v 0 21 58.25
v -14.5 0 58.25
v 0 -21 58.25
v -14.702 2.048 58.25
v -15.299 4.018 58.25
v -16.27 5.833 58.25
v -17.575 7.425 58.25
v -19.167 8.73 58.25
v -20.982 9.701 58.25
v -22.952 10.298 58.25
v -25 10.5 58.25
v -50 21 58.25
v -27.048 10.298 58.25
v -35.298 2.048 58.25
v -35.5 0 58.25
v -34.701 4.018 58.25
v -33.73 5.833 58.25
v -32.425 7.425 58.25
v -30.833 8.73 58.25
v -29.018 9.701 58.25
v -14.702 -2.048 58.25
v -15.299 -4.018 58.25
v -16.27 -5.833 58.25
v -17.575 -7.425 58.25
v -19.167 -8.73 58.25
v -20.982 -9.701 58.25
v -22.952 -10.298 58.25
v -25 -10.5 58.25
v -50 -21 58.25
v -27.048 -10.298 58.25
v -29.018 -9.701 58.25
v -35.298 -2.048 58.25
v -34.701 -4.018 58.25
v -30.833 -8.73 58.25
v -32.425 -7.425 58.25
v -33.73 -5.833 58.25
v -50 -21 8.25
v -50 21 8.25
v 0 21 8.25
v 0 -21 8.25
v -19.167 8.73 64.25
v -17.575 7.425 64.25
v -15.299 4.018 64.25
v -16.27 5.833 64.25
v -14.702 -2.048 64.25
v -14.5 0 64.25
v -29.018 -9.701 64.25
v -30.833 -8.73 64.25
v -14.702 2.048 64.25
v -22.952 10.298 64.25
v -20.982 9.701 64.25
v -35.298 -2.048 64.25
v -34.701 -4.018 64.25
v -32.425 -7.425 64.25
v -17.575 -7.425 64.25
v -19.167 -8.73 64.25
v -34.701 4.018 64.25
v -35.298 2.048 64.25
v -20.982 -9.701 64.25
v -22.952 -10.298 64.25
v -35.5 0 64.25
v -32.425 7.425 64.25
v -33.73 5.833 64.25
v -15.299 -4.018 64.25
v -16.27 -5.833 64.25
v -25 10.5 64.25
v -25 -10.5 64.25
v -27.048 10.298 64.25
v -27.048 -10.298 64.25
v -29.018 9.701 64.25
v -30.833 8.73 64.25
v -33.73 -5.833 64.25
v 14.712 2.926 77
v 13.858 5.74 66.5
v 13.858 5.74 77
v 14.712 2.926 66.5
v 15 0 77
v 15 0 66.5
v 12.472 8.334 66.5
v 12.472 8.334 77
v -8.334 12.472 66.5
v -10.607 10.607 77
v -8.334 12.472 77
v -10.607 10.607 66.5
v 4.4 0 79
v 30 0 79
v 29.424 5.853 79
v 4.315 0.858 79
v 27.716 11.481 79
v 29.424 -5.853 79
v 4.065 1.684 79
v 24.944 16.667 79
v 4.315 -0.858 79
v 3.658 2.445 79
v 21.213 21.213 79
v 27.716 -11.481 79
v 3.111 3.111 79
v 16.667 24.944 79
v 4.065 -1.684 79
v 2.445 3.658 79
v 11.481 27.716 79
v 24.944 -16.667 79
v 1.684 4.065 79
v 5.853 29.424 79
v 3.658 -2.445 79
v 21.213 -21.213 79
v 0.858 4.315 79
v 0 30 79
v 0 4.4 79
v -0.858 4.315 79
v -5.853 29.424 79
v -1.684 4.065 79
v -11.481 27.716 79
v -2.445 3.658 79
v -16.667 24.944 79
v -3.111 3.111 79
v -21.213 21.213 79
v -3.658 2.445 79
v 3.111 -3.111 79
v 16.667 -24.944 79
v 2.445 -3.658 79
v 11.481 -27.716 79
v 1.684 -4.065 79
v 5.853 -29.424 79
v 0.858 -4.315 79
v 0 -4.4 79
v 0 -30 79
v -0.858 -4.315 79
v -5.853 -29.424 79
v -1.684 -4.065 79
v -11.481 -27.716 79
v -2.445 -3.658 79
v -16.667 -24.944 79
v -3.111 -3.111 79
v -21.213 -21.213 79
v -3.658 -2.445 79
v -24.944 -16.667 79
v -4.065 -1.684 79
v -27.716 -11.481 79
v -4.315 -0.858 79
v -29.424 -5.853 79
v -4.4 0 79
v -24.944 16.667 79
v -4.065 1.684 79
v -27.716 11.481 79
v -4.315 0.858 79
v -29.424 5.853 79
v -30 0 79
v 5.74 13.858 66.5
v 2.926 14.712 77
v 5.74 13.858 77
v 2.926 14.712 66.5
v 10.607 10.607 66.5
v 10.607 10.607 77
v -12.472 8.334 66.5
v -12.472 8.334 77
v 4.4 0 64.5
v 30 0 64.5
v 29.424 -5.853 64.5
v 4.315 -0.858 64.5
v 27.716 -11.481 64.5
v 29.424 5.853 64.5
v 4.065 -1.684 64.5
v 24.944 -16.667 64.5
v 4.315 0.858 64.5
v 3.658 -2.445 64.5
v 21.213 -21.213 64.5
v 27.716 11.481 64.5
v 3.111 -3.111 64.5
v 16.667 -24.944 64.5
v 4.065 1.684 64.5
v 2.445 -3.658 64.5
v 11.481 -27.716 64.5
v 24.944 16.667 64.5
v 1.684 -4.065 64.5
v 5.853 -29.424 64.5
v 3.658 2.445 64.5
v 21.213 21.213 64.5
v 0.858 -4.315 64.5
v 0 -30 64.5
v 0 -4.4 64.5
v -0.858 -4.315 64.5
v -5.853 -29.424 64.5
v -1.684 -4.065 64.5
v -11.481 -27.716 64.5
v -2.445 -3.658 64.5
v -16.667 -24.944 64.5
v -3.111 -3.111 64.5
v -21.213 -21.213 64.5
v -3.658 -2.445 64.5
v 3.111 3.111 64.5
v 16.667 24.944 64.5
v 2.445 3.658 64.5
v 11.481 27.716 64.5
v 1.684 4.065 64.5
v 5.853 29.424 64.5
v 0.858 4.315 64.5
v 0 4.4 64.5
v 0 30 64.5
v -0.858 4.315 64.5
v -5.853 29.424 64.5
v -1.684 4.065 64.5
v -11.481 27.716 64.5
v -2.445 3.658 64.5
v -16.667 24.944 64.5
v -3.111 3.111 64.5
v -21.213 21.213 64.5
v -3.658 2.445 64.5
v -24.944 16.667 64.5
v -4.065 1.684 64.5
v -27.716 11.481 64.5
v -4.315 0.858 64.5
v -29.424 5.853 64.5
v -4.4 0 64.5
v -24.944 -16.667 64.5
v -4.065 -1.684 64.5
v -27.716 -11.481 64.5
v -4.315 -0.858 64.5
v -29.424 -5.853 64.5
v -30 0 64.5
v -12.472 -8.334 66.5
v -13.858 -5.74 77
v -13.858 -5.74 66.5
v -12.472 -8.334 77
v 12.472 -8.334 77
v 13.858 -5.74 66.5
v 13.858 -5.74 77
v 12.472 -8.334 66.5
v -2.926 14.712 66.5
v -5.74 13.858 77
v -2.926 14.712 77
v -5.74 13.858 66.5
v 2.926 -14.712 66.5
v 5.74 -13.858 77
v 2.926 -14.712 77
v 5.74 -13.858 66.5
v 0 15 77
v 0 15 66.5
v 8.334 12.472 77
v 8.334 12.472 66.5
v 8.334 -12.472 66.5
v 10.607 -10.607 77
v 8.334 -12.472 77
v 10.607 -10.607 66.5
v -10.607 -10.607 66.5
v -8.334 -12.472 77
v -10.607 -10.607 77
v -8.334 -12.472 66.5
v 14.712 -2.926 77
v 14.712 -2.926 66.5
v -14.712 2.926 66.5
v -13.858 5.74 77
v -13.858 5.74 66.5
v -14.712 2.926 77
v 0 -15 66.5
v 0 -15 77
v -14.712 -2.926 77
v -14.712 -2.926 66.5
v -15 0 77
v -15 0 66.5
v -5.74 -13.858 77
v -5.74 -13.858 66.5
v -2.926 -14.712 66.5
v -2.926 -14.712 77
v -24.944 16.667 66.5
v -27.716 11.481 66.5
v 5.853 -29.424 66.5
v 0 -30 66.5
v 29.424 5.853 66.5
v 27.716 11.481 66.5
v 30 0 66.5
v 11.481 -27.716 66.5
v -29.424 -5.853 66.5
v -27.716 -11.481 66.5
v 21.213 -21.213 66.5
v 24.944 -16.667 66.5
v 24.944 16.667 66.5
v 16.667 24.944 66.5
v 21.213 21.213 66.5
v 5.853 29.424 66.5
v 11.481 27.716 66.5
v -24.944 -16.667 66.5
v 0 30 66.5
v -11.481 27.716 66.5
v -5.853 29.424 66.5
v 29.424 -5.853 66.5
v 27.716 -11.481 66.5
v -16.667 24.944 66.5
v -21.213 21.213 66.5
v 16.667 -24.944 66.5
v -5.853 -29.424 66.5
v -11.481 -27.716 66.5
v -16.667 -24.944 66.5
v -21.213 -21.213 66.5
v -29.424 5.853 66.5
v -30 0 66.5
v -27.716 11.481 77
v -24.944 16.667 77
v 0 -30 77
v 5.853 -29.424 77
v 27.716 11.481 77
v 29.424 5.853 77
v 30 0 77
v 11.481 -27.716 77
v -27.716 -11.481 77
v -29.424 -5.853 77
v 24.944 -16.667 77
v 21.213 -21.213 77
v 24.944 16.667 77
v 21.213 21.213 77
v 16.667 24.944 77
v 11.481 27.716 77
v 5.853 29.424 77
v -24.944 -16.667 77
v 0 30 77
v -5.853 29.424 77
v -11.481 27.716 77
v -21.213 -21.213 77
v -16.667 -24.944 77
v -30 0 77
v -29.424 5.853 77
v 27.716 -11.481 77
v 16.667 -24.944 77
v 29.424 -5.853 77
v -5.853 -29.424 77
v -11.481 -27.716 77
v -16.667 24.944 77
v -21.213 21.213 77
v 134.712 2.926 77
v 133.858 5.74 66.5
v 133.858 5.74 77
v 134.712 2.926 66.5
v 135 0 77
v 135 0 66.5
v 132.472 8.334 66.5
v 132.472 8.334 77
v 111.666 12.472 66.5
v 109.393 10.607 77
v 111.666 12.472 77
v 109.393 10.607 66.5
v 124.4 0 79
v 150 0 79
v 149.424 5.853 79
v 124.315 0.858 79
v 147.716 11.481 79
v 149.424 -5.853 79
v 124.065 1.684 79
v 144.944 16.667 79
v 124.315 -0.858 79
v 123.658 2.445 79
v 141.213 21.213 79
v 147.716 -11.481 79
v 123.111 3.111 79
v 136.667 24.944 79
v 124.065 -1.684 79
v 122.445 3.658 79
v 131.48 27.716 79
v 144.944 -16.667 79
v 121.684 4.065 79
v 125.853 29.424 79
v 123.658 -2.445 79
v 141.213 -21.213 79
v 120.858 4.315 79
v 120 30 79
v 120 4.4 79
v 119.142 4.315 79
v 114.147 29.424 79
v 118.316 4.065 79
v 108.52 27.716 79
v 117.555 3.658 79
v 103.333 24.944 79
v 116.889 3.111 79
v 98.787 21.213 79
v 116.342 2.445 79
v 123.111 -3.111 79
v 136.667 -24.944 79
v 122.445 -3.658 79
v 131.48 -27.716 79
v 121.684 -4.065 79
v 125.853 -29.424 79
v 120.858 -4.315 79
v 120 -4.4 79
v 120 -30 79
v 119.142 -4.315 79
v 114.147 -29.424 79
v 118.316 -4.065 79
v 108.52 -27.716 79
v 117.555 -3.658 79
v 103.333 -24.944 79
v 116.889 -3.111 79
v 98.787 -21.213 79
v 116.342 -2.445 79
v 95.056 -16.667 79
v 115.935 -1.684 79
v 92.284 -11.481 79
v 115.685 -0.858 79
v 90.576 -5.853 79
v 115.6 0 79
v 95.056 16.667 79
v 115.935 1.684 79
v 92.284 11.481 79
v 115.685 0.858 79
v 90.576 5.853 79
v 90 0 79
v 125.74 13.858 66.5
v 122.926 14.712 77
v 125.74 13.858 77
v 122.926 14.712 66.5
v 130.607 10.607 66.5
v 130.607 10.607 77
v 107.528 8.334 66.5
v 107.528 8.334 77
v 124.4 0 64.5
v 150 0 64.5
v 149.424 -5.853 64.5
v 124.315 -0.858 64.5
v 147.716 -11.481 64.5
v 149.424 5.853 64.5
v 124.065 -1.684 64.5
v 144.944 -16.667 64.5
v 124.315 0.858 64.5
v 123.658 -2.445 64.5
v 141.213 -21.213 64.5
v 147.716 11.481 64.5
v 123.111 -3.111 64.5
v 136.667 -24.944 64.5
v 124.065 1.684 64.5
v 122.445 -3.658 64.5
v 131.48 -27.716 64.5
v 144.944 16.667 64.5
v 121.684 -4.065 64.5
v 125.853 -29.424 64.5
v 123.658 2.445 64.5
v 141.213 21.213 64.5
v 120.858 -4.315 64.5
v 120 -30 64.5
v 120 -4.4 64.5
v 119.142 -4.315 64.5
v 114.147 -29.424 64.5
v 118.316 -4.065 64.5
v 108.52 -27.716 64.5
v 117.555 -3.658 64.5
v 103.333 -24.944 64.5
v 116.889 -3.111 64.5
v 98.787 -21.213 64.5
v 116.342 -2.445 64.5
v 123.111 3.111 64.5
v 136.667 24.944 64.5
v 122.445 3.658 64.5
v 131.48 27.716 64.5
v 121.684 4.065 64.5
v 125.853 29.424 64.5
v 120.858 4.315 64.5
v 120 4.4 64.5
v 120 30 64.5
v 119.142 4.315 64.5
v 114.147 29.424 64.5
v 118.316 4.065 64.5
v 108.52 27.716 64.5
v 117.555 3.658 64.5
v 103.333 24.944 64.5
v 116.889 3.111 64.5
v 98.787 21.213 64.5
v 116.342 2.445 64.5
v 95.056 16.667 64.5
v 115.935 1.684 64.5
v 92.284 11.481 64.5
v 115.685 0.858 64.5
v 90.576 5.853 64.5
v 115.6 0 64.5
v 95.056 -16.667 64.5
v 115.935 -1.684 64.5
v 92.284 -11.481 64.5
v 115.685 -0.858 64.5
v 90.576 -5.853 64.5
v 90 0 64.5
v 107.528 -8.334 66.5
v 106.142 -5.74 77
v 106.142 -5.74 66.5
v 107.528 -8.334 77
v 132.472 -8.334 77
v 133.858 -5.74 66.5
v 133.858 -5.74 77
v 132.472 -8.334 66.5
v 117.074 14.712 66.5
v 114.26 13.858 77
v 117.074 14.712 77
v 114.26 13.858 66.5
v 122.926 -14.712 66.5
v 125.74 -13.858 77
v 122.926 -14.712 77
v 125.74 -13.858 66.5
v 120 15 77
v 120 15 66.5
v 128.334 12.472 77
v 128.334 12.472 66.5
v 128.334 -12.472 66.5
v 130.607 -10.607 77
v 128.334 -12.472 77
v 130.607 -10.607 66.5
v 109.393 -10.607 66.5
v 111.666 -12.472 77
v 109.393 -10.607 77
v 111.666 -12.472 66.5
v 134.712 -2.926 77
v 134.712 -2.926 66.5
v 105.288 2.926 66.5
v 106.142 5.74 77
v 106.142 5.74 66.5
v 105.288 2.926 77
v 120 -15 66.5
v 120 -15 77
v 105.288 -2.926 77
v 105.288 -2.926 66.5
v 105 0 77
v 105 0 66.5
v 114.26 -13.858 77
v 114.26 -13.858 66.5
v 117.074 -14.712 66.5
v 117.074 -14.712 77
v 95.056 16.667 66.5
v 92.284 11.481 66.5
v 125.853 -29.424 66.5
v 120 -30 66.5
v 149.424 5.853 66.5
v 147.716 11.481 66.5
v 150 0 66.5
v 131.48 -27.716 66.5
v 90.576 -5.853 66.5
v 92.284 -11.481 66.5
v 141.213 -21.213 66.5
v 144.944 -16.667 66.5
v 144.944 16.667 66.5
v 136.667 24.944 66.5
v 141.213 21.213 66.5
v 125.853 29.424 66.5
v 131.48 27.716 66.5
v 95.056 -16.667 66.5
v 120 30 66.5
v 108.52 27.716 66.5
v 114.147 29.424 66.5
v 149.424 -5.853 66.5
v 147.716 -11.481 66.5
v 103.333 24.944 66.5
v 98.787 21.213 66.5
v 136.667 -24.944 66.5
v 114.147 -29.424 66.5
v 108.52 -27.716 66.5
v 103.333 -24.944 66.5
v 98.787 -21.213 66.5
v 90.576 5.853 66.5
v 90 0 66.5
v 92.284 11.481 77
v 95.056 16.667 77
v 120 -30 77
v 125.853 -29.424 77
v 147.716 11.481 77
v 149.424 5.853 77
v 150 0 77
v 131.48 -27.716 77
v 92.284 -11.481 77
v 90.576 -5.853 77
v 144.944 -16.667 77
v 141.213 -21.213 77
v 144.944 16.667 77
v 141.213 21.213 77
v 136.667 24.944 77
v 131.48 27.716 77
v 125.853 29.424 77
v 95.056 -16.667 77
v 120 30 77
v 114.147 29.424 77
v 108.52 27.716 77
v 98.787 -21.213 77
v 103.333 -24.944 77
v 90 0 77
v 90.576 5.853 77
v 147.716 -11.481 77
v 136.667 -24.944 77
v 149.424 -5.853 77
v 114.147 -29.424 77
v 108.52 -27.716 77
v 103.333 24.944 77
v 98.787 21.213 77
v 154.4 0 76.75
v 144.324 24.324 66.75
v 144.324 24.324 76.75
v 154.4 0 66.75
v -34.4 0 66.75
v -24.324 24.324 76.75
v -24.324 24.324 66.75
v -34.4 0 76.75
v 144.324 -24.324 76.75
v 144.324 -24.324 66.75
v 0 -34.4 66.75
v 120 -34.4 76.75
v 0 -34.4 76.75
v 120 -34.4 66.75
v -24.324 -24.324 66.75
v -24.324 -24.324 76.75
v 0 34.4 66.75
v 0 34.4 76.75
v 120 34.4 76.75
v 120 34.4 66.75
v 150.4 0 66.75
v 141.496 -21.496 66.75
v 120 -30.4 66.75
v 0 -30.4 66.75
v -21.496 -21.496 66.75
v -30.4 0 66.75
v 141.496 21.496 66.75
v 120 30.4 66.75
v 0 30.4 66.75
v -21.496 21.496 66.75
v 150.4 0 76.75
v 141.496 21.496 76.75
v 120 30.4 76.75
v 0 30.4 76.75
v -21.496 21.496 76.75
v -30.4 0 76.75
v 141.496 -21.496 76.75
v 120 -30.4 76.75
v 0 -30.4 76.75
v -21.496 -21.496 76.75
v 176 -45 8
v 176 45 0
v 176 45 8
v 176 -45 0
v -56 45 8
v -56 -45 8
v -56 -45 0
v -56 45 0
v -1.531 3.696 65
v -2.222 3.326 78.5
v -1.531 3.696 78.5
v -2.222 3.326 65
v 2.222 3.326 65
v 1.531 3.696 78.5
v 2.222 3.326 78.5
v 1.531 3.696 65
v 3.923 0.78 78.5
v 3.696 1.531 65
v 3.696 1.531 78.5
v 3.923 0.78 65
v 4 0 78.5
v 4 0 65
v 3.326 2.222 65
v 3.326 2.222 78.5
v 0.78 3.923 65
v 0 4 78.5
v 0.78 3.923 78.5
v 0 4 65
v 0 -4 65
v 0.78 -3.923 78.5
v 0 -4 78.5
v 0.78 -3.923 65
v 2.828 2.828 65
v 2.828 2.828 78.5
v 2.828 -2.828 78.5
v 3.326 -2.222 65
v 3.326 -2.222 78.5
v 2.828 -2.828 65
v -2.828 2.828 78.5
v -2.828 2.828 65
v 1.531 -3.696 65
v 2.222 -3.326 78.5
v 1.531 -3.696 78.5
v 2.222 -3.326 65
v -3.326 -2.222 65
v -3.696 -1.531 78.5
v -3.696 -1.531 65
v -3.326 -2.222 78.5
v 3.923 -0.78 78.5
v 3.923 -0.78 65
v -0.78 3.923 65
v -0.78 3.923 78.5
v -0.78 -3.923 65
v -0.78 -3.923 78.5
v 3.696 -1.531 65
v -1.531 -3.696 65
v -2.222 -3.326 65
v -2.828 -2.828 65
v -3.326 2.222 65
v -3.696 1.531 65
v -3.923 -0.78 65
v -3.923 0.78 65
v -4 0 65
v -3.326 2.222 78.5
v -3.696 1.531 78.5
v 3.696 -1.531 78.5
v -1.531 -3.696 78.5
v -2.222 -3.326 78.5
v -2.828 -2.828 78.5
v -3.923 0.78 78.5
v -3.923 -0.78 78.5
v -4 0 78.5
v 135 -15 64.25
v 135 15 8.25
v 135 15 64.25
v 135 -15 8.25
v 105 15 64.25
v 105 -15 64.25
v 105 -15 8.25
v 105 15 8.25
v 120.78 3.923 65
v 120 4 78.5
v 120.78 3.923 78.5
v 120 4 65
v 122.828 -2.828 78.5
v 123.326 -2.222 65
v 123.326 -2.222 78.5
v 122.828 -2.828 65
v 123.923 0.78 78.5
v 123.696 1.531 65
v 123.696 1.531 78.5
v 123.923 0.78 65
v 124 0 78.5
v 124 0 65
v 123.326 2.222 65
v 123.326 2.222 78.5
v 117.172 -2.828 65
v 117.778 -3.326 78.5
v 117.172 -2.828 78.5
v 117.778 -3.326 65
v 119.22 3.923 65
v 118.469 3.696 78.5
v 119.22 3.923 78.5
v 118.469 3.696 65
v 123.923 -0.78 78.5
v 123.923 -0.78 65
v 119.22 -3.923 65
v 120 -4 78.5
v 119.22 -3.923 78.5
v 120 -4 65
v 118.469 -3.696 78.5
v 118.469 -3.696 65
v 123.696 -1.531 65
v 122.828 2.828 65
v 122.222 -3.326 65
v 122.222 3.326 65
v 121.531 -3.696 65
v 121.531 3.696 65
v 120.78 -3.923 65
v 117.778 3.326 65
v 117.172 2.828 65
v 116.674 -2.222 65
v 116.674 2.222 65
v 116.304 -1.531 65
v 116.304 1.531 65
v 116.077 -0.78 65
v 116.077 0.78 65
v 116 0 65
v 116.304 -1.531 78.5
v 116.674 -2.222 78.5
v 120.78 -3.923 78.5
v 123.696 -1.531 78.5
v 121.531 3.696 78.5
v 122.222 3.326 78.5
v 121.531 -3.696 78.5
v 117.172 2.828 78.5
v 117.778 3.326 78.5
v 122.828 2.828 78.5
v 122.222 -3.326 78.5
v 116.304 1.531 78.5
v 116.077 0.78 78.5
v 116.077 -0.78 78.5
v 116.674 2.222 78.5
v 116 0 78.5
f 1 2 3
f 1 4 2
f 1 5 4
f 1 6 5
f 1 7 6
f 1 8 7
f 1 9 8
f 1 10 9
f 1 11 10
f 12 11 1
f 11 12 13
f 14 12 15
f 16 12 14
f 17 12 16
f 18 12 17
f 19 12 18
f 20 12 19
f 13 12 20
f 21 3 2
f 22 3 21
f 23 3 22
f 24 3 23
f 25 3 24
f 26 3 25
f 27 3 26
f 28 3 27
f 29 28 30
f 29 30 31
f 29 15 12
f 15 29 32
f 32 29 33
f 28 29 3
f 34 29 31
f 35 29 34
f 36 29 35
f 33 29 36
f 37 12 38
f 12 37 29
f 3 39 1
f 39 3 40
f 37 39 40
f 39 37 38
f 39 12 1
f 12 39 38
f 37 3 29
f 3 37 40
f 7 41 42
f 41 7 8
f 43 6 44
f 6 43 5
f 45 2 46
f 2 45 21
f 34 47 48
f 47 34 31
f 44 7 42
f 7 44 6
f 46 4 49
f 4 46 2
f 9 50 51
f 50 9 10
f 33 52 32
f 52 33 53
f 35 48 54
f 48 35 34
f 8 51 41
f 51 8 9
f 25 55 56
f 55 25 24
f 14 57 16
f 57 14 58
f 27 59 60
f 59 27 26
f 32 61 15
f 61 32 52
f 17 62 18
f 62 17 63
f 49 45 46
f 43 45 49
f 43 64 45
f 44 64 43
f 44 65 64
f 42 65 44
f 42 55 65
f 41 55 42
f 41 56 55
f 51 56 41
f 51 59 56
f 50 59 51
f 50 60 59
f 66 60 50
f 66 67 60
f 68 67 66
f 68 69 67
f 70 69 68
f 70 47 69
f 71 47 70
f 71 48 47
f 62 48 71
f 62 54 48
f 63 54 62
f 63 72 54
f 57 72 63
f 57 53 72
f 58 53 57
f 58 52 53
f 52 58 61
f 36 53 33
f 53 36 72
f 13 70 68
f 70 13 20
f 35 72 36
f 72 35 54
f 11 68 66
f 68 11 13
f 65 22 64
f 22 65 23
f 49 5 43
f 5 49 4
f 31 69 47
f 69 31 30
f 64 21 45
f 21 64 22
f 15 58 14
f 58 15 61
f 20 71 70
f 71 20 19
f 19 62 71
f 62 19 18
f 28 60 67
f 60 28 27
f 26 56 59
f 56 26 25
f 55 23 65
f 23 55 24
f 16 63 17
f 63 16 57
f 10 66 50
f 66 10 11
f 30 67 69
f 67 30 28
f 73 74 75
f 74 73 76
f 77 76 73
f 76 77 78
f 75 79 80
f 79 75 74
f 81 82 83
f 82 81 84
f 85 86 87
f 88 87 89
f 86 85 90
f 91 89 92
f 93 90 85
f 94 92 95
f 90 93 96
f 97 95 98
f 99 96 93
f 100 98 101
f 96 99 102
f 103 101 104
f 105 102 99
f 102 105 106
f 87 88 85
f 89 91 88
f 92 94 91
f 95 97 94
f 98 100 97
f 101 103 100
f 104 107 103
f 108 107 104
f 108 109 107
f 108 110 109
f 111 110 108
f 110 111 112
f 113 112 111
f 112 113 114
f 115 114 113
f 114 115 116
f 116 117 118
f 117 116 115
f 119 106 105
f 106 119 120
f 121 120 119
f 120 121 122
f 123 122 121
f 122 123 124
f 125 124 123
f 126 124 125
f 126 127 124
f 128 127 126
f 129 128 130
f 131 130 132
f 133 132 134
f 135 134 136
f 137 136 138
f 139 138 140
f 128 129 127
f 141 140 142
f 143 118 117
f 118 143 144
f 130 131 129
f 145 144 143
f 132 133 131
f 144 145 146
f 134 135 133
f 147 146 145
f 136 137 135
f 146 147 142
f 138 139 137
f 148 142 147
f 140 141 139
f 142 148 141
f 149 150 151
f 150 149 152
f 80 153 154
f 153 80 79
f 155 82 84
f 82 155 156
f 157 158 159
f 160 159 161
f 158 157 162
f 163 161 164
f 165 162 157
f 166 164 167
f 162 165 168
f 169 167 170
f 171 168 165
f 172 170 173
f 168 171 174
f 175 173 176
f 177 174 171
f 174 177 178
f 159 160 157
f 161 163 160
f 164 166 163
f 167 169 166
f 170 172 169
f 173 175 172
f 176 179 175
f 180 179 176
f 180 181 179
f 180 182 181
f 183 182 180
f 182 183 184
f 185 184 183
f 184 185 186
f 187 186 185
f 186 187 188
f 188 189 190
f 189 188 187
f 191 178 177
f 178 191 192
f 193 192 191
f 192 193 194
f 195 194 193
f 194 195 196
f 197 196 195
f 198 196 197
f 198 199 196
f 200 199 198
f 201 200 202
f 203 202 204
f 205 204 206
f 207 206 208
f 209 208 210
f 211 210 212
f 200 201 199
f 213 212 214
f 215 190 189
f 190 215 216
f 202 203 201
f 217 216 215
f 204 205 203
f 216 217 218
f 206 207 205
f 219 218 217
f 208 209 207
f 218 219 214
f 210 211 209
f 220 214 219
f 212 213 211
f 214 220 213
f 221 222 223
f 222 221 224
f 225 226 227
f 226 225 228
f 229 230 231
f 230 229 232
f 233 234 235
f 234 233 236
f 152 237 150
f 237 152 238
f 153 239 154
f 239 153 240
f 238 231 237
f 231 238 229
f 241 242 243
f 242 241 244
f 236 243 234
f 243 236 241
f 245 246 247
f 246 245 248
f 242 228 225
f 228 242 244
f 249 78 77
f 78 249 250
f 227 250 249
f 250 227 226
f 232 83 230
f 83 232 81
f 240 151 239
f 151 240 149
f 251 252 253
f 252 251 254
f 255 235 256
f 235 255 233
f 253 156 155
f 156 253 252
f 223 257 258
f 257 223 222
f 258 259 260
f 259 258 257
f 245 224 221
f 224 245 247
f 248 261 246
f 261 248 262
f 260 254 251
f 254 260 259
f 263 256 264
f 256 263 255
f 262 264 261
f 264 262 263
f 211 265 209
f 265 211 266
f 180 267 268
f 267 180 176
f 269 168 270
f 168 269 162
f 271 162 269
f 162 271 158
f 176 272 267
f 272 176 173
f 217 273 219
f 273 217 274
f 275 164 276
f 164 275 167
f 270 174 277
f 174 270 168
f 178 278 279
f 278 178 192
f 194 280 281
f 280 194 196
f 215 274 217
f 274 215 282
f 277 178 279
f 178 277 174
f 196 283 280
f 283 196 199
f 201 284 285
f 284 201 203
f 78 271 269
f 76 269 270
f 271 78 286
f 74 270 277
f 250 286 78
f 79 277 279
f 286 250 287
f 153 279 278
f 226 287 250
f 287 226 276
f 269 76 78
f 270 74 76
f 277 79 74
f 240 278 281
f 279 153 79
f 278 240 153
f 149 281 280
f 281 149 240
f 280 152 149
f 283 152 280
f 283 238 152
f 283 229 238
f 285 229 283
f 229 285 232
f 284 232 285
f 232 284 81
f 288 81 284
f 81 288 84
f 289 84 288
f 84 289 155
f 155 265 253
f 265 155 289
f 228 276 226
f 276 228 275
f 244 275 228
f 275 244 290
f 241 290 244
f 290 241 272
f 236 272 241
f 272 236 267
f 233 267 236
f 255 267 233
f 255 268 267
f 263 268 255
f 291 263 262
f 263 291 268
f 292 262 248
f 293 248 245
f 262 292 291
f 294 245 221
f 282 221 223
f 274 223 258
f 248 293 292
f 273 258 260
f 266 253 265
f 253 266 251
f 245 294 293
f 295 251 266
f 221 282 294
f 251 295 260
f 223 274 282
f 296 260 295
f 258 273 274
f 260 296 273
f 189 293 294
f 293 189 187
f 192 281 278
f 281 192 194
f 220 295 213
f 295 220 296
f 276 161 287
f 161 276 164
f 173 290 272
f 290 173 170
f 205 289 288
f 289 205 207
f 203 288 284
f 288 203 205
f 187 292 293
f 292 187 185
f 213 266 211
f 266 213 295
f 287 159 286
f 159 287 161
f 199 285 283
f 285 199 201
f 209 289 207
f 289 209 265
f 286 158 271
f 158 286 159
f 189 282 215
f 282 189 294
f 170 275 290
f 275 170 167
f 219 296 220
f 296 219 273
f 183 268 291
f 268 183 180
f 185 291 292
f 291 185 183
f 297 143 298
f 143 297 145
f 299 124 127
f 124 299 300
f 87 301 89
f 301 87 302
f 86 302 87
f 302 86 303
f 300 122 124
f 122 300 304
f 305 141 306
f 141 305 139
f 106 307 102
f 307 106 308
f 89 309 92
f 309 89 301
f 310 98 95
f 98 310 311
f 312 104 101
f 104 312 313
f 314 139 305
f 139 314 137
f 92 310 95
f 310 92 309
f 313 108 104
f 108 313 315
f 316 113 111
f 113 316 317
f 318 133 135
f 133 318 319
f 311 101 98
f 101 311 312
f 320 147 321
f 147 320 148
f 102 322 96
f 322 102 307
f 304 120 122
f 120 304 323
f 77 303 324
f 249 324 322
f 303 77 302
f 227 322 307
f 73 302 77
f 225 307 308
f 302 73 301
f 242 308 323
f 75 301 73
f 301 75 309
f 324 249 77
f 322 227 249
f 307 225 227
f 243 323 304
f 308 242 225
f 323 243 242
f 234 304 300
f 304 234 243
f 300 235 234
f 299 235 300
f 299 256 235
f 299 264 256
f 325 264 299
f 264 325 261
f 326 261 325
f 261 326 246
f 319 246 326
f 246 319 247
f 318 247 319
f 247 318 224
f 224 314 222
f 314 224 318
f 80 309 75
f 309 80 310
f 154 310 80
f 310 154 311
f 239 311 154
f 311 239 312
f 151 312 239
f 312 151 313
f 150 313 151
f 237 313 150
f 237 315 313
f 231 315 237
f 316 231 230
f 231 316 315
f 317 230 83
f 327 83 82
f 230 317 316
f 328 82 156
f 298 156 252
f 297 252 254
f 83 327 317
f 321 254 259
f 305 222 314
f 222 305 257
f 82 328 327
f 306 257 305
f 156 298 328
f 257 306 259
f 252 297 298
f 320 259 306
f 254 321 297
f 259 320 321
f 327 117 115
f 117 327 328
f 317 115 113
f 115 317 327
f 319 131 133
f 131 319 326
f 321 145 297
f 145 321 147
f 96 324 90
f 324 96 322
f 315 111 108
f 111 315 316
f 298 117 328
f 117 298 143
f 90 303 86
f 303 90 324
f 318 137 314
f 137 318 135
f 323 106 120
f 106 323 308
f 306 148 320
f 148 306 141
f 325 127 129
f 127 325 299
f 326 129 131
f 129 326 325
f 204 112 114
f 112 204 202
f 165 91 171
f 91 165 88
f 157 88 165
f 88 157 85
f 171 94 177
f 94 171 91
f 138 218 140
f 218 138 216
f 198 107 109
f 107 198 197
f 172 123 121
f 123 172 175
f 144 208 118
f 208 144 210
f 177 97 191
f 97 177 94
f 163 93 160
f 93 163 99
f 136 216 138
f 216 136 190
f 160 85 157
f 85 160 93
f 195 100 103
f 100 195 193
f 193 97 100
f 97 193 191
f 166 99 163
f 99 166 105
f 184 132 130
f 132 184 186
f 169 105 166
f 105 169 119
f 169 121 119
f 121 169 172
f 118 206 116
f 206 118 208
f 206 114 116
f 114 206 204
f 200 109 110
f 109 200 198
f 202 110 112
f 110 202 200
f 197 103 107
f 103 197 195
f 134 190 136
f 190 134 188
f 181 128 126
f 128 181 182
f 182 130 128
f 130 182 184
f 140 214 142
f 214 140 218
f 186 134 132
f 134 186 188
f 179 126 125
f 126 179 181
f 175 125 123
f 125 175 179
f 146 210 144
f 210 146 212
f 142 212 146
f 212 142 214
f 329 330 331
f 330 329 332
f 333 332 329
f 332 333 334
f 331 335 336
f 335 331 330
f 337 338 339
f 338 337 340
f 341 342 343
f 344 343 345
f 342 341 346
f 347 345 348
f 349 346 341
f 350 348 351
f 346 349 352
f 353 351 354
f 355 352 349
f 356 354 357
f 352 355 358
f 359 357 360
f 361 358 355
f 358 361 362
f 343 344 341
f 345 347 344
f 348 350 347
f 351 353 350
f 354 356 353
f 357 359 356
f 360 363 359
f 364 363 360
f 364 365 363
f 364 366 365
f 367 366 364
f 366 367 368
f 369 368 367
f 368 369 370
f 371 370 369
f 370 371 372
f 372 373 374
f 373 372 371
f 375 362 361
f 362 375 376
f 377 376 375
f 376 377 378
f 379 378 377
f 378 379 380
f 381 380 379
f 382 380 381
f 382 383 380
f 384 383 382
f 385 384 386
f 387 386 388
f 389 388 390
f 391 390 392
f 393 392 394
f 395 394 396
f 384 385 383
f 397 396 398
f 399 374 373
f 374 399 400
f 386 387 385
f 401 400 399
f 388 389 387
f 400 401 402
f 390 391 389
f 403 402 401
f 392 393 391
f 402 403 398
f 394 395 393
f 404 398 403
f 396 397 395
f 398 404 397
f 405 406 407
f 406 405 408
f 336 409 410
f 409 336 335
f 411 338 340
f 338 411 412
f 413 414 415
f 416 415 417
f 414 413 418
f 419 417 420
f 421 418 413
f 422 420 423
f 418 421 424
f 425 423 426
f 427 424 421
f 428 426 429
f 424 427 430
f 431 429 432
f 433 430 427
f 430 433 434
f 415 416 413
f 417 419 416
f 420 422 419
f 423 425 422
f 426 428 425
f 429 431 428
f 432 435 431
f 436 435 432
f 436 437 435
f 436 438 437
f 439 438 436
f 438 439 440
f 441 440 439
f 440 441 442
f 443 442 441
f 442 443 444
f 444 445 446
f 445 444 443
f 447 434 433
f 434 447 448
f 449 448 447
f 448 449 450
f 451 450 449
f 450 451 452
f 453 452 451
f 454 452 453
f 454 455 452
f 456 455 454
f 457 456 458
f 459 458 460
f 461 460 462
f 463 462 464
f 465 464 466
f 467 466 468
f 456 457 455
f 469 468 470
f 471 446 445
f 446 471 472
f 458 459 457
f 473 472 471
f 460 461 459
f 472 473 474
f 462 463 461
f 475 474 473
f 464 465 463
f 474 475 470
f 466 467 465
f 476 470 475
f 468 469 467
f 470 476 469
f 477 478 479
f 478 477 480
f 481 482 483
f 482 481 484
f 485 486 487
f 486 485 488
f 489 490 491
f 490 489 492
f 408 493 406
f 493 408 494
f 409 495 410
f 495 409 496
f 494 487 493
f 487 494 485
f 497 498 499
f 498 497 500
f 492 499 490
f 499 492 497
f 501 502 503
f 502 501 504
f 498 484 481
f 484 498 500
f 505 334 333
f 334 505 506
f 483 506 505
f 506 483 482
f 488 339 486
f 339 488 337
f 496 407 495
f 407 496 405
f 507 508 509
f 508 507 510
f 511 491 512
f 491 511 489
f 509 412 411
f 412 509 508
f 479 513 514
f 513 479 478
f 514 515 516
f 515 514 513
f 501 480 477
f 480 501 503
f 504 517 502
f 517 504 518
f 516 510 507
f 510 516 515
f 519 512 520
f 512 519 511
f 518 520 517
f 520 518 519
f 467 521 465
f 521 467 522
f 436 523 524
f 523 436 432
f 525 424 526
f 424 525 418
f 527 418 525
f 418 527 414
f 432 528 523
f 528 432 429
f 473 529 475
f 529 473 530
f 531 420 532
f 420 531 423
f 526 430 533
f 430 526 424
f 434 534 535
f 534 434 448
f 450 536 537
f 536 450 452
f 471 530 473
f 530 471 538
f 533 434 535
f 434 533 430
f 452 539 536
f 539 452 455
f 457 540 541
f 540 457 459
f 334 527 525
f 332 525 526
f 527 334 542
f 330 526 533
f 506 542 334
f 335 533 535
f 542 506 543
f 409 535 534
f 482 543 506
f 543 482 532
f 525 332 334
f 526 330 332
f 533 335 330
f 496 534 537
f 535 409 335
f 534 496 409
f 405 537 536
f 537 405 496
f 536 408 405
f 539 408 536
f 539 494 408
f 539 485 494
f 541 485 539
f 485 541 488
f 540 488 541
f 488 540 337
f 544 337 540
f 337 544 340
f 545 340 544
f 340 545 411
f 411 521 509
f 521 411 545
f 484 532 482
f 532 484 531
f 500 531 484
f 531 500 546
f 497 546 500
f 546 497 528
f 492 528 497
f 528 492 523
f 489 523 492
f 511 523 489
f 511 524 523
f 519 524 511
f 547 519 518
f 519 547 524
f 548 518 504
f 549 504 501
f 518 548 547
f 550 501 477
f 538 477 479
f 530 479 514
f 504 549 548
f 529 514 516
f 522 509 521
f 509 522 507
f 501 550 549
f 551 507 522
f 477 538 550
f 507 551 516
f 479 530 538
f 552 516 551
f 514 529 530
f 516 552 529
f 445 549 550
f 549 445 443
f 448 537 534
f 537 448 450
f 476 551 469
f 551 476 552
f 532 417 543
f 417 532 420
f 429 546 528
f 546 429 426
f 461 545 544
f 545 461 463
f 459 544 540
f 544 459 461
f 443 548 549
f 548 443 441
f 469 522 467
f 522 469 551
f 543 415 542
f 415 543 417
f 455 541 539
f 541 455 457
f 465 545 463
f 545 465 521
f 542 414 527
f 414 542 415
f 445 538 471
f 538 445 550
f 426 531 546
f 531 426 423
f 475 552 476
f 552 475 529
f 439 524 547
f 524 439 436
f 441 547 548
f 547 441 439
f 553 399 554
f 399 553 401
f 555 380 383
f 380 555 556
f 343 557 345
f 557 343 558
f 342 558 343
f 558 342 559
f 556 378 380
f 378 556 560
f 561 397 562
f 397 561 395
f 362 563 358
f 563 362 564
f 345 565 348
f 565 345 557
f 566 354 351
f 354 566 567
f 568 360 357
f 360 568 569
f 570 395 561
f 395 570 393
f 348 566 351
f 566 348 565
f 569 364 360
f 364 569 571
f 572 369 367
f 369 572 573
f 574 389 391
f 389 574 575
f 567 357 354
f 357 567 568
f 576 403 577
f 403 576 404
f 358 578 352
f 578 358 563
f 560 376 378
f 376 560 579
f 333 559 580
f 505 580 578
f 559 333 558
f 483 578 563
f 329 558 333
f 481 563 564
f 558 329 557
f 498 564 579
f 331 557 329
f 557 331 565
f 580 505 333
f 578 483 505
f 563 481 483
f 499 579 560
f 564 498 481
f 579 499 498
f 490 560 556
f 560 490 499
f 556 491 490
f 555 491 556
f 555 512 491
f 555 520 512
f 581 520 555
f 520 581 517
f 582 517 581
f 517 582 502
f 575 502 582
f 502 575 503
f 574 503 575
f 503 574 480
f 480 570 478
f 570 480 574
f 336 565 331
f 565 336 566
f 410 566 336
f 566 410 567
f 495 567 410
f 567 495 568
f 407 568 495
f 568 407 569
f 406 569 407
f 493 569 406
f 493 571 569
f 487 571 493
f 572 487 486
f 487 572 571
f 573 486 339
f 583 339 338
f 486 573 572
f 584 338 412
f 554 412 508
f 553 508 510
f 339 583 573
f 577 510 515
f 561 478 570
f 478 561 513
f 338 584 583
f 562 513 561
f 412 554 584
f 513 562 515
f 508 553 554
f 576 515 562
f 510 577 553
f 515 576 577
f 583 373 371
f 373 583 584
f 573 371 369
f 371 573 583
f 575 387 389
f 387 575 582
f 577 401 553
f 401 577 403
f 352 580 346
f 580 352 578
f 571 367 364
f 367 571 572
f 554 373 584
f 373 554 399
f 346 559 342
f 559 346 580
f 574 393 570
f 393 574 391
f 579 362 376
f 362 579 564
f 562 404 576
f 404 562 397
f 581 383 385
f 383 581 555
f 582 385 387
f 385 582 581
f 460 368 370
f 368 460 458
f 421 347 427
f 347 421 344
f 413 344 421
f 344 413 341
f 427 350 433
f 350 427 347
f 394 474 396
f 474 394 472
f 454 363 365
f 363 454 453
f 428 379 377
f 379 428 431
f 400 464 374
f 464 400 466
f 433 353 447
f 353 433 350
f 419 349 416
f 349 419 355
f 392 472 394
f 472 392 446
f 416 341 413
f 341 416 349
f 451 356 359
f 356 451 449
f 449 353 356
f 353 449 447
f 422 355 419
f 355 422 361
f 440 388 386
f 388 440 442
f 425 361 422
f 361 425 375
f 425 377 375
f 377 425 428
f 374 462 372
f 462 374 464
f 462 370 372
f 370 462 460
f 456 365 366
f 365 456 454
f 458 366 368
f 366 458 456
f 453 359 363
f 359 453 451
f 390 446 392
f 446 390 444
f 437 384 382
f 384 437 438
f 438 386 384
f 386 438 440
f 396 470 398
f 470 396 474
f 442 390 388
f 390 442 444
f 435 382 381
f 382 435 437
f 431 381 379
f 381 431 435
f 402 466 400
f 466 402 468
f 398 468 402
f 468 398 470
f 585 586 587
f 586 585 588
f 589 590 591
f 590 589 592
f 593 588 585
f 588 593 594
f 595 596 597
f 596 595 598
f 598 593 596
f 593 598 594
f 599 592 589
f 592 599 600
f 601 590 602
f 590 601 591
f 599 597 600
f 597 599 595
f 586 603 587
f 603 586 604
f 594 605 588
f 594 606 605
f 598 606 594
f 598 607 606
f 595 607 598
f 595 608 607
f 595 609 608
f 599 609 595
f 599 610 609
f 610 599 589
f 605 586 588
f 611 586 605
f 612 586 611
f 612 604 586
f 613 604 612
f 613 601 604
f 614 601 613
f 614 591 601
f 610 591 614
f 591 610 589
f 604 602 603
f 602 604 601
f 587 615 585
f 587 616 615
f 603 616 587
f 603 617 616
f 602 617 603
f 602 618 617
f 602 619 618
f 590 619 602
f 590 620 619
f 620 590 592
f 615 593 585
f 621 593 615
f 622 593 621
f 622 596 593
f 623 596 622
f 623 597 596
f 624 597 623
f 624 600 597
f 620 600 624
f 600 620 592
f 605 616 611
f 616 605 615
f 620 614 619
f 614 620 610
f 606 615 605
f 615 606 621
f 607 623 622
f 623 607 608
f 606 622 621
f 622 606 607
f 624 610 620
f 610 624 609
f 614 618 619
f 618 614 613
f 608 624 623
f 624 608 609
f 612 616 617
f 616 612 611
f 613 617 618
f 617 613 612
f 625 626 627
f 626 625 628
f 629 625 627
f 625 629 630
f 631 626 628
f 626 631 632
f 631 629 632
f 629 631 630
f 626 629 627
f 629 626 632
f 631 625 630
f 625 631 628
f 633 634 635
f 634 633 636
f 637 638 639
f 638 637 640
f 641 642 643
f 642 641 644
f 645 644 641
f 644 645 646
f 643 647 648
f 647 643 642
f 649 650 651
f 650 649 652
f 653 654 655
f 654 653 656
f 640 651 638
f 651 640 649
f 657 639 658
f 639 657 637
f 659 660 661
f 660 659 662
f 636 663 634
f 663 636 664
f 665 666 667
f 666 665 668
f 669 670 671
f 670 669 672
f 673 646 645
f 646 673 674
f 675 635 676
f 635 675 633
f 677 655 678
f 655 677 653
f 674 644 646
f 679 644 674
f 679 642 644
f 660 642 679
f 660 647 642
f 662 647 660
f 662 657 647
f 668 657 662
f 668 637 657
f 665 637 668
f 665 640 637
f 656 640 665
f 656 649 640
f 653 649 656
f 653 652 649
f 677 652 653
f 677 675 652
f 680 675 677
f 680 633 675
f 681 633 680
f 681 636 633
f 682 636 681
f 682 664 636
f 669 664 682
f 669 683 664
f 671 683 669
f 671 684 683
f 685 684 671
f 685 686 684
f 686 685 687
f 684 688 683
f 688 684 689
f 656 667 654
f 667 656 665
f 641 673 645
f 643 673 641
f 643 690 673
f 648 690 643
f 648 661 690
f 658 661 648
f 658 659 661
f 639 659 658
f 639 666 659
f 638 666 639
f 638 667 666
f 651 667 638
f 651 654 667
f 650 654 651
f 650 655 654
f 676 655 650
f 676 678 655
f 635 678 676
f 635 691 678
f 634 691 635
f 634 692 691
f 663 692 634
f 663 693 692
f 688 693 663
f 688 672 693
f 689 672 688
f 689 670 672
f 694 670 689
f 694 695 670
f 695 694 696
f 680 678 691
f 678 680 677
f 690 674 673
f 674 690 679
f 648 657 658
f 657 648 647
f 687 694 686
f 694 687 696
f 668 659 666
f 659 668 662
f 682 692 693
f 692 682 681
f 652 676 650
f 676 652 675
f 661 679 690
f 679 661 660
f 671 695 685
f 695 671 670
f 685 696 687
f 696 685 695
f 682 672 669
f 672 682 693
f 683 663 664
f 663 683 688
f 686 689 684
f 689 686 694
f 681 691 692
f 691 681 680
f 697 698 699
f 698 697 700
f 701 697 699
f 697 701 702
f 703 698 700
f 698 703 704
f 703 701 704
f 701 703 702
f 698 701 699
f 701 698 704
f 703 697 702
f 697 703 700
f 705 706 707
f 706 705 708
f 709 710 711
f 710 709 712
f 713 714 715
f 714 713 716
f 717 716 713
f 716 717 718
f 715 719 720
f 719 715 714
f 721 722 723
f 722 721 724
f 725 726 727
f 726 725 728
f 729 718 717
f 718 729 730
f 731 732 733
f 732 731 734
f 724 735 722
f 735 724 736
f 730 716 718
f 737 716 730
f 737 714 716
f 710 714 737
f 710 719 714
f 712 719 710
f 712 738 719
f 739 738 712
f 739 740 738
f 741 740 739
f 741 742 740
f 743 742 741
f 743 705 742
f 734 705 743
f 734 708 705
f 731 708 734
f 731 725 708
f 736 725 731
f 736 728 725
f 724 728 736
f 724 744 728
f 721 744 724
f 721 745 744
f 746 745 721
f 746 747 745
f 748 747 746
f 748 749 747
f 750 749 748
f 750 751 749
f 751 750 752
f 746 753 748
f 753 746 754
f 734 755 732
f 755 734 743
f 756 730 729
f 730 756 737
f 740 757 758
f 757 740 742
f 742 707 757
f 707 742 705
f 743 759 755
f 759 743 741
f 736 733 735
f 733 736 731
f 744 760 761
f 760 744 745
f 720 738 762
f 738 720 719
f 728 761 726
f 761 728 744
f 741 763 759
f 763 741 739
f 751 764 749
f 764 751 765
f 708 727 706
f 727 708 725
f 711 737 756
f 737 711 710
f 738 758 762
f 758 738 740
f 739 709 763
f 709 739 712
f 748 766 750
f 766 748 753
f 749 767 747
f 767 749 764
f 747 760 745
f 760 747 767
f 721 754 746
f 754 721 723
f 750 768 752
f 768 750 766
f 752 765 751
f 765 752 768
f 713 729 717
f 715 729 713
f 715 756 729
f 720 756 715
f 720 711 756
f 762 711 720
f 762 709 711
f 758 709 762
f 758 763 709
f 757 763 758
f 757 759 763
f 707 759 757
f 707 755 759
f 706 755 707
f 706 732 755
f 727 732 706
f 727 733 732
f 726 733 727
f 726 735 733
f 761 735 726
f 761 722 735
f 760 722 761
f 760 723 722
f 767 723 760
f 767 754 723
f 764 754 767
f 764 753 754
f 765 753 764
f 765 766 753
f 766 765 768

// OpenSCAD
$fn = 32;

// ------------------------------------------------------------------------
// Motor belt drive: span 120 mm, pulleys d60, belt 10 mm wide
// Every part is its own module, assembly() places every instance.
// ------------------------------------------------------------------------

// --- part 1 ---
module base_plate() {
  difference() {
    translate([-116, -45, 0]) cube([232, 90, 8]);
  }
}

// --- part 2 ---
module motor() {
  union() {
    translate([-25, -21, 0]) cube([50, 42, 50]);
    translate([28, 0, 25]) rotate([0, 90, 0]) cylinder(h = 6, d = 21, center = true);
  }
}

// --- part 3 ---
module drive_shaft() {
  translate([0, 0, -6.75]) cylinder(h = 13.5, d = 8);
}

// --- part 4 ---
module pulley_drive() {
  difference() {
    union() {
      cylinder(h = 14.5, d = 30);
      cylinder(h = 2, d = 60);
      translate([0, 0, 12.5]) cylinder(h = 2, d = 60);
    }
    translate([0, 0, -1]) cylinder(h = 16.5, d = 8.8);
  }
}

// --- part 5 ---
module idler_post() {
  translate([-15, -15, 0]) cube([30, 30, 56]);
}

// --- part 6 ---
module driven_shaft() {
  translate([0, 0, -6.75]) cylinder(h = 13.5, d = 8);
}

// --- part 7 ---
module pulley_driven() {
  difference() {
    union() {
      cylinder(h = 14.5, d = 30);
      cylinder(h = 2, d = 60);
      translate([0, 0, 12.5]) cylinder(h = 2, d = 60);
    }
    translate([0, 0, -1]) cylinder(h = 16.5, d = 8.8);
  }
}

// --- part 8 ---
module drive_belt() {
  difference() {
    linear_extrude(height = 10) polygon(points = concat([for (a = [90 : 45 : 270]) [34.4 * cos(a), 34.4 * sin(a)]], [for (a = [270 : 45 : 450]) [120 + 34.4 * cos(a), 34.4 * sin(a)]]));
    translate([0, 0, -1]) linear_extrude(height = 12) polygon(points = concat([for (a = [90 : 45 : 270]) [30.4 * cos(a), 30.4 * sin(a)]], [for (a = [270 : 45 : 450]) [120 + 30.4 * cos(a), 30.4 * sin(a)]]));
  }
}

// --- assembly ---
module assembly() {
  color([0.80, 0.24, 0.20]) translate([60, 0, 0]) rotate([0, 0, 0]) base_plate();
  color([0.20, 0.45, 0.75]) translate([0, 0, 33.25]) rotate([0, 270, 0]) motor();
  color([0.25, 0.62, 0.32]) translate([0, 0, 71.75]) rotate([0, 0, 0]) drive_shaft();
  color([0.92, 0.70, 0.18]) translate([0, 0, 64.5]) rotate([0, 0, 0]) pulley_drive();
  color([0.58, 0.35, 0.70]) translate([120, 0, 8.25]) rotate([0, 0, 0]) idler_post();
  color([0.16, 0.66, 0.66]) translate([120, 0, 71.75]) rotate([0, 0, 0]) driven_shaft();
  color([0.85, 0.48, 0.18]) translate([120, 0, 64.5]) rotate([0, 0, 0]) pulley_driven();
  color([0.55, 0.60, 0.65]) translate([0, 0, 66.75]) rotate([0, 0, 0]) drive_belt();
}

assembly();
